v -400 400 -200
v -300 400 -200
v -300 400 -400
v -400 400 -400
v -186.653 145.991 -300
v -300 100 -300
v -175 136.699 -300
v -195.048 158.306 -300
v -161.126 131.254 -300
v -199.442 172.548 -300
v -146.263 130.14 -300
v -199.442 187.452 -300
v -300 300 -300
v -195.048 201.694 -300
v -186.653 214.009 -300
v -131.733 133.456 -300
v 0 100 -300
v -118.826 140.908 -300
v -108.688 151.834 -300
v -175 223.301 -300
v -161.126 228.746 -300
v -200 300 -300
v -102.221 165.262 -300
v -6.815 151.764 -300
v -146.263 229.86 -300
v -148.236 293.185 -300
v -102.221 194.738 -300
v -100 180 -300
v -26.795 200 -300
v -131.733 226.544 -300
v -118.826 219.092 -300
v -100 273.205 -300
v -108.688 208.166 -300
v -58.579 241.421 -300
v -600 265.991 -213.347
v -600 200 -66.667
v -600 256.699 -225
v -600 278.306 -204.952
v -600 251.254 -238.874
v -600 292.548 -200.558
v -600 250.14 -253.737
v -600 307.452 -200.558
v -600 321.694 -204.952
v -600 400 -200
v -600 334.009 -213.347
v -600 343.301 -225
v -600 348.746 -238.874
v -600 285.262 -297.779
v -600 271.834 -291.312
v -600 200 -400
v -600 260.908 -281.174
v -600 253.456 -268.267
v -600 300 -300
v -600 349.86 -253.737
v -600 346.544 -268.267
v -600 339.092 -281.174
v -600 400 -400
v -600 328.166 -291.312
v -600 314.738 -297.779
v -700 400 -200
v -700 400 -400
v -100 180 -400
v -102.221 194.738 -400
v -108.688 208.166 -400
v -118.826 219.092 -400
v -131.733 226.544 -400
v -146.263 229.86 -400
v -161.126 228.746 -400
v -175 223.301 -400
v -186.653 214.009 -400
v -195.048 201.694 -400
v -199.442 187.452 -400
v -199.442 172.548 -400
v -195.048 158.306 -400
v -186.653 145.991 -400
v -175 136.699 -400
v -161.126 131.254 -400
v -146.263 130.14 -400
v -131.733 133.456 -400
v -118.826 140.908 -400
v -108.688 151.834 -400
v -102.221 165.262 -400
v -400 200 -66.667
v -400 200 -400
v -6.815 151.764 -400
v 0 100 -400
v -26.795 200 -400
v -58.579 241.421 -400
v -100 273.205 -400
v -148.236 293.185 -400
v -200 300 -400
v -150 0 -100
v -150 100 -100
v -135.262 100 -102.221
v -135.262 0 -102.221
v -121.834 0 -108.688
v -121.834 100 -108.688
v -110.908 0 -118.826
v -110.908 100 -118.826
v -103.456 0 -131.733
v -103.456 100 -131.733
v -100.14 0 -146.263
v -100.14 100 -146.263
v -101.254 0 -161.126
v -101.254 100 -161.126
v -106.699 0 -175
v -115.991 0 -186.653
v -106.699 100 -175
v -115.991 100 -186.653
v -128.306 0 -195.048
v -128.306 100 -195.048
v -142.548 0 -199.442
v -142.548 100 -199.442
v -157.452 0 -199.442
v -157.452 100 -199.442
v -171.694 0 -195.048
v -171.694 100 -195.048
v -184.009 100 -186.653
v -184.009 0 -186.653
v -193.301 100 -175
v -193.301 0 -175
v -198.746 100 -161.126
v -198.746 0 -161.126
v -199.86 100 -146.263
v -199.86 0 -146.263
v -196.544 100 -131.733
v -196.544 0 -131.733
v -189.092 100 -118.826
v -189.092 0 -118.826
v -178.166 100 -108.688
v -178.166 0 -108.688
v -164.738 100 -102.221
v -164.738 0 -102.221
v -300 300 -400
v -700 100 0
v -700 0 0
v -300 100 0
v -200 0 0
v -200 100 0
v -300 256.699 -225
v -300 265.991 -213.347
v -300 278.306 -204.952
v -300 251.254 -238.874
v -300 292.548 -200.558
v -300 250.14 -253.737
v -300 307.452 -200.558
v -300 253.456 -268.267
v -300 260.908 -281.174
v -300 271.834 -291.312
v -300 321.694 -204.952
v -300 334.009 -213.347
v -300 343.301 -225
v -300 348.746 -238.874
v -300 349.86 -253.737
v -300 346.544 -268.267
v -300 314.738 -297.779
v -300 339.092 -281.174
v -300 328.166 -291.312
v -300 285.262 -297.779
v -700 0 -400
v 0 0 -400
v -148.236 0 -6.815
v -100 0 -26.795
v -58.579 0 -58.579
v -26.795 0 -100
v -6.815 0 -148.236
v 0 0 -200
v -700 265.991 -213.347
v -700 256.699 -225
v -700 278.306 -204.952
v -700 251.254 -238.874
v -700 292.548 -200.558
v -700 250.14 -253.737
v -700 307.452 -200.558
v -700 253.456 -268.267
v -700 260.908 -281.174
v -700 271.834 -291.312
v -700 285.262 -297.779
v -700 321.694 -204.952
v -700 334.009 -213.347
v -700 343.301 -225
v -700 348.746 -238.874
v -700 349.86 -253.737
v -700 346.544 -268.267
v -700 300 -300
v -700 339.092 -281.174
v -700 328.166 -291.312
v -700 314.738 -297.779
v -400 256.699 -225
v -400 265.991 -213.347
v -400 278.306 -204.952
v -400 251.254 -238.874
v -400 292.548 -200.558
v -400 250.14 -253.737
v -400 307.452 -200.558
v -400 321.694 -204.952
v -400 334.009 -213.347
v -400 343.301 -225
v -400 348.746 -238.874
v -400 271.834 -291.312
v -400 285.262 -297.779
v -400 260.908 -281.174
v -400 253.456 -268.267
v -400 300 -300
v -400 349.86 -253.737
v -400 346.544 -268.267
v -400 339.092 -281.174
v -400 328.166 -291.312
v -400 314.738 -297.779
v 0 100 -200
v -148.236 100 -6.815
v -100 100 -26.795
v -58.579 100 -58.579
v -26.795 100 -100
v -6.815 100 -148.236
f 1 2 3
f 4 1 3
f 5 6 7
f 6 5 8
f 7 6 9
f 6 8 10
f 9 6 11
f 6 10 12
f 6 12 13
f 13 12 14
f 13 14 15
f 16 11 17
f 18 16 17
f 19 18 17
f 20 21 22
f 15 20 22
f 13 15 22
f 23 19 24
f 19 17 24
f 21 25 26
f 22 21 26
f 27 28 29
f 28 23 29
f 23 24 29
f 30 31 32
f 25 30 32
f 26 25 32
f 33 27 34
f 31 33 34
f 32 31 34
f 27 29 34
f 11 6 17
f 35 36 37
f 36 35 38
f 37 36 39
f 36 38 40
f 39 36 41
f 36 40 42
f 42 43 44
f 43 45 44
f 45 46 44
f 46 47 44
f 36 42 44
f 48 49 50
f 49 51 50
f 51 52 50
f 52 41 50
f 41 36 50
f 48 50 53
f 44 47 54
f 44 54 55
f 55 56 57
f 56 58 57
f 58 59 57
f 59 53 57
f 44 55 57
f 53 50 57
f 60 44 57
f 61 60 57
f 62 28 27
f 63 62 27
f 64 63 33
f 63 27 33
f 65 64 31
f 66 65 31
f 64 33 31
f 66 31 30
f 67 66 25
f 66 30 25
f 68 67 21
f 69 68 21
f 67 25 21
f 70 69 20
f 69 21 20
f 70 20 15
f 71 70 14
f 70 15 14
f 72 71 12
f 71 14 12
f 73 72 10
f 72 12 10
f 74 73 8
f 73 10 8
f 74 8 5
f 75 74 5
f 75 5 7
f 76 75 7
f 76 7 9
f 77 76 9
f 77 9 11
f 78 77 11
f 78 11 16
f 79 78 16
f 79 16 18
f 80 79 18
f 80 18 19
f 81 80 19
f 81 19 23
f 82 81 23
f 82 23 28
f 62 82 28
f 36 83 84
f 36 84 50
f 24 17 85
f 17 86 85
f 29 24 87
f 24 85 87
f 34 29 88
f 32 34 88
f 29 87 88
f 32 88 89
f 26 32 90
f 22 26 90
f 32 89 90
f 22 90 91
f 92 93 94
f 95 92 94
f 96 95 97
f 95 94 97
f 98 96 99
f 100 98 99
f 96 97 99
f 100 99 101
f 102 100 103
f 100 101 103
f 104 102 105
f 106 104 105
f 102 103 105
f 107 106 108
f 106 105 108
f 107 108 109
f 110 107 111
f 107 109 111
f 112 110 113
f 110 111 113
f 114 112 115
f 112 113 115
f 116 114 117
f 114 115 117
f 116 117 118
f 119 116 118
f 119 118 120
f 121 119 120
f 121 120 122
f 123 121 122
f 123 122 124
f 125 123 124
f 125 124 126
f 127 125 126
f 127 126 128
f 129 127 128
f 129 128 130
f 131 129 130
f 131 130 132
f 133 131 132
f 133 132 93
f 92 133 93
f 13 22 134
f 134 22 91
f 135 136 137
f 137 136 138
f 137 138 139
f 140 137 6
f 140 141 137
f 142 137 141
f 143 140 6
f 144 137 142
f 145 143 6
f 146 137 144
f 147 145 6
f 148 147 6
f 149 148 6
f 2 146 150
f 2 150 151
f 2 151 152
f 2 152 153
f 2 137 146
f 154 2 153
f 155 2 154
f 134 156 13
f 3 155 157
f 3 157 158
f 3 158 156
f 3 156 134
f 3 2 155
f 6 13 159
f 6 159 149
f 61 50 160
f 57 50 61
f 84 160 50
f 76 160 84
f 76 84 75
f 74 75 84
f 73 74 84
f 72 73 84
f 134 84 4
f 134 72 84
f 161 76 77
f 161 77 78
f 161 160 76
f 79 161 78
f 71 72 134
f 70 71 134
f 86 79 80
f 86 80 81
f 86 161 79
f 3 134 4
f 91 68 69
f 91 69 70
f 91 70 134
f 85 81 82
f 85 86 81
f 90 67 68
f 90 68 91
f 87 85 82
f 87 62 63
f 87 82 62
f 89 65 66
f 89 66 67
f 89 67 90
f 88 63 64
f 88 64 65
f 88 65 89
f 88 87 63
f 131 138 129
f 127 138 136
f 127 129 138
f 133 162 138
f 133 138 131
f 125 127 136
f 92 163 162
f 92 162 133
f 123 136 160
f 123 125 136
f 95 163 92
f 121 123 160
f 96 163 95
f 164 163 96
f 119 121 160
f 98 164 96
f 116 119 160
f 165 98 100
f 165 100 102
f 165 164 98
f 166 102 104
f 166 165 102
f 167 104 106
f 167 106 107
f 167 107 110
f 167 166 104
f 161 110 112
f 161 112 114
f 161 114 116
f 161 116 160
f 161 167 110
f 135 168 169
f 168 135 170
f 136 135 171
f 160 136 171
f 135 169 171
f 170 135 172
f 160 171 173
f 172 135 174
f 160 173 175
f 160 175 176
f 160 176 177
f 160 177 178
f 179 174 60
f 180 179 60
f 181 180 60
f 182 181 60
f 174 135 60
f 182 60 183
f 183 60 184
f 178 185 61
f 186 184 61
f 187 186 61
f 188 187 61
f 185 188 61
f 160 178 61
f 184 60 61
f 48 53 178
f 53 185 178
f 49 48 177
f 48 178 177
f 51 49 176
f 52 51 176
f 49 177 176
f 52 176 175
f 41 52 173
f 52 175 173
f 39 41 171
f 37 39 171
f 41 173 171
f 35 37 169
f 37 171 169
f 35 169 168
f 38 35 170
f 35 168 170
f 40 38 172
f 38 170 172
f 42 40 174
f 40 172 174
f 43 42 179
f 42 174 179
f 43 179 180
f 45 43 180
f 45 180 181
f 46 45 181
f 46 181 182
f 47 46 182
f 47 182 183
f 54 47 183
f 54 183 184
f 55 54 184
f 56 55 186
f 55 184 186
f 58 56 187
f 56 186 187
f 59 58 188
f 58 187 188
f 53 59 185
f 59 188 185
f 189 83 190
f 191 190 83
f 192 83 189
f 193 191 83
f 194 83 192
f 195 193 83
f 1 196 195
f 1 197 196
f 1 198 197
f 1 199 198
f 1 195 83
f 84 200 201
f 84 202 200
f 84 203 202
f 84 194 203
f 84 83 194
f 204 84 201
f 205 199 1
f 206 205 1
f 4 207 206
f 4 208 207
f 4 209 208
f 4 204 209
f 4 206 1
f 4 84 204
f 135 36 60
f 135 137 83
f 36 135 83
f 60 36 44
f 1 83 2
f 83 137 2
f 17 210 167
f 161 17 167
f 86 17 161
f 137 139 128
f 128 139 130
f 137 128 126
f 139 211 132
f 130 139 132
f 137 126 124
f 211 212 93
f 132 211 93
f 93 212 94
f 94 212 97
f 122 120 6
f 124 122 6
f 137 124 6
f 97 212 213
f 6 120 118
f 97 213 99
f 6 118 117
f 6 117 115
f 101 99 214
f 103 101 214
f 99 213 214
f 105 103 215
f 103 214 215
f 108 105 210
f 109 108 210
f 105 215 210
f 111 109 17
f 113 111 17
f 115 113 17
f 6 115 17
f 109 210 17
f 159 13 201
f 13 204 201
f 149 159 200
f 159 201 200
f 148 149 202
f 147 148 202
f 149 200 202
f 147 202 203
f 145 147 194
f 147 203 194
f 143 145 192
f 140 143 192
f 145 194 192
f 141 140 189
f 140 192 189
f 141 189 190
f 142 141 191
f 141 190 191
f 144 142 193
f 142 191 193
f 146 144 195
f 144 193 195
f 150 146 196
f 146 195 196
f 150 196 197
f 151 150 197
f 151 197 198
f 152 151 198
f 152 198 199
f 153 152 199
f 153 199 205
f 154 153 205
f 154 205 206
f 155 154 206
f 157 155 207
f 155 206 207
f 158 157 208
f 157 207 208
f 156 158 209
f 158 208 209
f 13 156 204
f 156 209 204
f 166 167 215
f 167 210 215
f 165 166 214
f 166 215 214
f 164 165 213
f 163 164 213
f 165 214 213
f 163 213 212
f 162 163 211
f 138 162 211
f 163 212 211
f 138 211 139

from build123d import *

# Parameters (mm, degrees)
SKETCH1_W           = 400
SKETCH1_H           = 400
BOSS_EXTRUDE1_DEPTH = 700
CUT_EXTRUDE1_DEPTH  = 700
SKETCH4_W           = 200
SKETCH4_H           = 200
CUT_EXTRUDE2_DEPTH  = 700
CUT_EXTRUDE3_DEPTH  = 300
FILLET1_R           = 200
SKETCH6_R           = 50
CUT_EXTRUDE4_DEPTH  = 300
FILLET2_R           = 200
SKETCH7_R           = 50
CUT_EXTRUDE5_DEPTH  = 228
SKETCH8_R           = 50
CUT_EXTRUDE6_DEPTH  = 708


with BuildPart() as part:
    # Sketch1 → Boss-Extrude1 (new body)
    with BuildSketch(Plane(origin=(0, 0, 0), x_dir=(0, 0, -1), z_dir=(1, 0, 0))):
        with Locations((200, 200)):
            Rectangle(SKETCH1_W, SKETCH1_H)
    extrude(amount=-BOSS_EXTRUDE1_DEPTH)

    # Sketch2 → Cut-Extrude1 (cut)
    with BuildSketch(Plane(origin=(0, 0, 0), x_dir=(0, 0, -1), z_dir=(1, 0, 0))):
        Polygon((0, 400), (0, 100), (200, 400), align=None)
    extrude(amount=-CUT_EXTRUDE1_DEPTH, mode=Mode.SUBTRACT)

    # Sketch4 → Cut-Extrude2 (cut)
    with BuildSketch(Plane(origin=(0, 0, -400), x_dir=(-1, 0, 0), z_dir=(0, 0, -1))):
        with Locations((500, 300)):
            Rectangle(SKETCH4_W, SKETCH4_H)
    extrude(amount=-CUT_EXTRUDE2_DEPTH, mode=Mode.SUBTRACT)

    # Sketch5 → Cut-Extrude3 (cut)
    with BuildSketch(Plane(origin=(0, 0, 0), x_dir=(0, 0, -1), z_dir=(1, 0, 0))):
        Polygon((0, 100), (300, 100), (300, 300), (400, 300), (400, 400), (200, 400), align=None)
    extrude(amount=-CUT_EXTRUDE3_DEPTH, mode=Mode.SUBTRACT)

    # Fillet1
    fillet1_edges = [part.edges().sort_by_distance(p)[0] for p in [
        (0, 300, -350),
    ]]
    fillet(fillet1_edges, radius=FILLET1_R)

    # Sketch6 → Cut-Extrude4 (cut)
    with BuildSketch(Plane(origin=(0, 100, 0), x_dir=(1, 0, 0), z_dir=(0, 1, 0))):
        with Locations(Location((-150, 150, 0), (0, 0, 270))):
            Circle(SKETCH6_R)
    extrude(amount=-CUT_EXTRUDE4_DEPTH, mode=Mode.SUBTRACT)

    # Fillet2
    fillet2_edges = [part.edges().sort_by_distance(p)[0] for p in [
        (0, 50, 0),
    ]]
    fillet(fillet2_edges, radius=FILLET2_R)

    # Sketch7 → Cut-Extrude5 (cut)
    with BuildSketch(Plane.XY.offset(-300)):
        with Locations((-150, 180)):
            Circle(SKETCH7_R)
    extrude(amount=-CUT_EXTRUDE5_DEPTH, mode=Mode.SUBTRACT)

    # Sketch8 → Cut-Extrude6 (cut)
    with BuildSketch(Plane.ZY.offset(700)):
        with Locations(Location((-250, 300, 0), (0, 0, 180))):
            Circle(SKETCH8_R)
    extrude(amount=-CUT_EXTRUDE6_DEPTH, mode=Mode.SUBTRACT)


solid = part.part
